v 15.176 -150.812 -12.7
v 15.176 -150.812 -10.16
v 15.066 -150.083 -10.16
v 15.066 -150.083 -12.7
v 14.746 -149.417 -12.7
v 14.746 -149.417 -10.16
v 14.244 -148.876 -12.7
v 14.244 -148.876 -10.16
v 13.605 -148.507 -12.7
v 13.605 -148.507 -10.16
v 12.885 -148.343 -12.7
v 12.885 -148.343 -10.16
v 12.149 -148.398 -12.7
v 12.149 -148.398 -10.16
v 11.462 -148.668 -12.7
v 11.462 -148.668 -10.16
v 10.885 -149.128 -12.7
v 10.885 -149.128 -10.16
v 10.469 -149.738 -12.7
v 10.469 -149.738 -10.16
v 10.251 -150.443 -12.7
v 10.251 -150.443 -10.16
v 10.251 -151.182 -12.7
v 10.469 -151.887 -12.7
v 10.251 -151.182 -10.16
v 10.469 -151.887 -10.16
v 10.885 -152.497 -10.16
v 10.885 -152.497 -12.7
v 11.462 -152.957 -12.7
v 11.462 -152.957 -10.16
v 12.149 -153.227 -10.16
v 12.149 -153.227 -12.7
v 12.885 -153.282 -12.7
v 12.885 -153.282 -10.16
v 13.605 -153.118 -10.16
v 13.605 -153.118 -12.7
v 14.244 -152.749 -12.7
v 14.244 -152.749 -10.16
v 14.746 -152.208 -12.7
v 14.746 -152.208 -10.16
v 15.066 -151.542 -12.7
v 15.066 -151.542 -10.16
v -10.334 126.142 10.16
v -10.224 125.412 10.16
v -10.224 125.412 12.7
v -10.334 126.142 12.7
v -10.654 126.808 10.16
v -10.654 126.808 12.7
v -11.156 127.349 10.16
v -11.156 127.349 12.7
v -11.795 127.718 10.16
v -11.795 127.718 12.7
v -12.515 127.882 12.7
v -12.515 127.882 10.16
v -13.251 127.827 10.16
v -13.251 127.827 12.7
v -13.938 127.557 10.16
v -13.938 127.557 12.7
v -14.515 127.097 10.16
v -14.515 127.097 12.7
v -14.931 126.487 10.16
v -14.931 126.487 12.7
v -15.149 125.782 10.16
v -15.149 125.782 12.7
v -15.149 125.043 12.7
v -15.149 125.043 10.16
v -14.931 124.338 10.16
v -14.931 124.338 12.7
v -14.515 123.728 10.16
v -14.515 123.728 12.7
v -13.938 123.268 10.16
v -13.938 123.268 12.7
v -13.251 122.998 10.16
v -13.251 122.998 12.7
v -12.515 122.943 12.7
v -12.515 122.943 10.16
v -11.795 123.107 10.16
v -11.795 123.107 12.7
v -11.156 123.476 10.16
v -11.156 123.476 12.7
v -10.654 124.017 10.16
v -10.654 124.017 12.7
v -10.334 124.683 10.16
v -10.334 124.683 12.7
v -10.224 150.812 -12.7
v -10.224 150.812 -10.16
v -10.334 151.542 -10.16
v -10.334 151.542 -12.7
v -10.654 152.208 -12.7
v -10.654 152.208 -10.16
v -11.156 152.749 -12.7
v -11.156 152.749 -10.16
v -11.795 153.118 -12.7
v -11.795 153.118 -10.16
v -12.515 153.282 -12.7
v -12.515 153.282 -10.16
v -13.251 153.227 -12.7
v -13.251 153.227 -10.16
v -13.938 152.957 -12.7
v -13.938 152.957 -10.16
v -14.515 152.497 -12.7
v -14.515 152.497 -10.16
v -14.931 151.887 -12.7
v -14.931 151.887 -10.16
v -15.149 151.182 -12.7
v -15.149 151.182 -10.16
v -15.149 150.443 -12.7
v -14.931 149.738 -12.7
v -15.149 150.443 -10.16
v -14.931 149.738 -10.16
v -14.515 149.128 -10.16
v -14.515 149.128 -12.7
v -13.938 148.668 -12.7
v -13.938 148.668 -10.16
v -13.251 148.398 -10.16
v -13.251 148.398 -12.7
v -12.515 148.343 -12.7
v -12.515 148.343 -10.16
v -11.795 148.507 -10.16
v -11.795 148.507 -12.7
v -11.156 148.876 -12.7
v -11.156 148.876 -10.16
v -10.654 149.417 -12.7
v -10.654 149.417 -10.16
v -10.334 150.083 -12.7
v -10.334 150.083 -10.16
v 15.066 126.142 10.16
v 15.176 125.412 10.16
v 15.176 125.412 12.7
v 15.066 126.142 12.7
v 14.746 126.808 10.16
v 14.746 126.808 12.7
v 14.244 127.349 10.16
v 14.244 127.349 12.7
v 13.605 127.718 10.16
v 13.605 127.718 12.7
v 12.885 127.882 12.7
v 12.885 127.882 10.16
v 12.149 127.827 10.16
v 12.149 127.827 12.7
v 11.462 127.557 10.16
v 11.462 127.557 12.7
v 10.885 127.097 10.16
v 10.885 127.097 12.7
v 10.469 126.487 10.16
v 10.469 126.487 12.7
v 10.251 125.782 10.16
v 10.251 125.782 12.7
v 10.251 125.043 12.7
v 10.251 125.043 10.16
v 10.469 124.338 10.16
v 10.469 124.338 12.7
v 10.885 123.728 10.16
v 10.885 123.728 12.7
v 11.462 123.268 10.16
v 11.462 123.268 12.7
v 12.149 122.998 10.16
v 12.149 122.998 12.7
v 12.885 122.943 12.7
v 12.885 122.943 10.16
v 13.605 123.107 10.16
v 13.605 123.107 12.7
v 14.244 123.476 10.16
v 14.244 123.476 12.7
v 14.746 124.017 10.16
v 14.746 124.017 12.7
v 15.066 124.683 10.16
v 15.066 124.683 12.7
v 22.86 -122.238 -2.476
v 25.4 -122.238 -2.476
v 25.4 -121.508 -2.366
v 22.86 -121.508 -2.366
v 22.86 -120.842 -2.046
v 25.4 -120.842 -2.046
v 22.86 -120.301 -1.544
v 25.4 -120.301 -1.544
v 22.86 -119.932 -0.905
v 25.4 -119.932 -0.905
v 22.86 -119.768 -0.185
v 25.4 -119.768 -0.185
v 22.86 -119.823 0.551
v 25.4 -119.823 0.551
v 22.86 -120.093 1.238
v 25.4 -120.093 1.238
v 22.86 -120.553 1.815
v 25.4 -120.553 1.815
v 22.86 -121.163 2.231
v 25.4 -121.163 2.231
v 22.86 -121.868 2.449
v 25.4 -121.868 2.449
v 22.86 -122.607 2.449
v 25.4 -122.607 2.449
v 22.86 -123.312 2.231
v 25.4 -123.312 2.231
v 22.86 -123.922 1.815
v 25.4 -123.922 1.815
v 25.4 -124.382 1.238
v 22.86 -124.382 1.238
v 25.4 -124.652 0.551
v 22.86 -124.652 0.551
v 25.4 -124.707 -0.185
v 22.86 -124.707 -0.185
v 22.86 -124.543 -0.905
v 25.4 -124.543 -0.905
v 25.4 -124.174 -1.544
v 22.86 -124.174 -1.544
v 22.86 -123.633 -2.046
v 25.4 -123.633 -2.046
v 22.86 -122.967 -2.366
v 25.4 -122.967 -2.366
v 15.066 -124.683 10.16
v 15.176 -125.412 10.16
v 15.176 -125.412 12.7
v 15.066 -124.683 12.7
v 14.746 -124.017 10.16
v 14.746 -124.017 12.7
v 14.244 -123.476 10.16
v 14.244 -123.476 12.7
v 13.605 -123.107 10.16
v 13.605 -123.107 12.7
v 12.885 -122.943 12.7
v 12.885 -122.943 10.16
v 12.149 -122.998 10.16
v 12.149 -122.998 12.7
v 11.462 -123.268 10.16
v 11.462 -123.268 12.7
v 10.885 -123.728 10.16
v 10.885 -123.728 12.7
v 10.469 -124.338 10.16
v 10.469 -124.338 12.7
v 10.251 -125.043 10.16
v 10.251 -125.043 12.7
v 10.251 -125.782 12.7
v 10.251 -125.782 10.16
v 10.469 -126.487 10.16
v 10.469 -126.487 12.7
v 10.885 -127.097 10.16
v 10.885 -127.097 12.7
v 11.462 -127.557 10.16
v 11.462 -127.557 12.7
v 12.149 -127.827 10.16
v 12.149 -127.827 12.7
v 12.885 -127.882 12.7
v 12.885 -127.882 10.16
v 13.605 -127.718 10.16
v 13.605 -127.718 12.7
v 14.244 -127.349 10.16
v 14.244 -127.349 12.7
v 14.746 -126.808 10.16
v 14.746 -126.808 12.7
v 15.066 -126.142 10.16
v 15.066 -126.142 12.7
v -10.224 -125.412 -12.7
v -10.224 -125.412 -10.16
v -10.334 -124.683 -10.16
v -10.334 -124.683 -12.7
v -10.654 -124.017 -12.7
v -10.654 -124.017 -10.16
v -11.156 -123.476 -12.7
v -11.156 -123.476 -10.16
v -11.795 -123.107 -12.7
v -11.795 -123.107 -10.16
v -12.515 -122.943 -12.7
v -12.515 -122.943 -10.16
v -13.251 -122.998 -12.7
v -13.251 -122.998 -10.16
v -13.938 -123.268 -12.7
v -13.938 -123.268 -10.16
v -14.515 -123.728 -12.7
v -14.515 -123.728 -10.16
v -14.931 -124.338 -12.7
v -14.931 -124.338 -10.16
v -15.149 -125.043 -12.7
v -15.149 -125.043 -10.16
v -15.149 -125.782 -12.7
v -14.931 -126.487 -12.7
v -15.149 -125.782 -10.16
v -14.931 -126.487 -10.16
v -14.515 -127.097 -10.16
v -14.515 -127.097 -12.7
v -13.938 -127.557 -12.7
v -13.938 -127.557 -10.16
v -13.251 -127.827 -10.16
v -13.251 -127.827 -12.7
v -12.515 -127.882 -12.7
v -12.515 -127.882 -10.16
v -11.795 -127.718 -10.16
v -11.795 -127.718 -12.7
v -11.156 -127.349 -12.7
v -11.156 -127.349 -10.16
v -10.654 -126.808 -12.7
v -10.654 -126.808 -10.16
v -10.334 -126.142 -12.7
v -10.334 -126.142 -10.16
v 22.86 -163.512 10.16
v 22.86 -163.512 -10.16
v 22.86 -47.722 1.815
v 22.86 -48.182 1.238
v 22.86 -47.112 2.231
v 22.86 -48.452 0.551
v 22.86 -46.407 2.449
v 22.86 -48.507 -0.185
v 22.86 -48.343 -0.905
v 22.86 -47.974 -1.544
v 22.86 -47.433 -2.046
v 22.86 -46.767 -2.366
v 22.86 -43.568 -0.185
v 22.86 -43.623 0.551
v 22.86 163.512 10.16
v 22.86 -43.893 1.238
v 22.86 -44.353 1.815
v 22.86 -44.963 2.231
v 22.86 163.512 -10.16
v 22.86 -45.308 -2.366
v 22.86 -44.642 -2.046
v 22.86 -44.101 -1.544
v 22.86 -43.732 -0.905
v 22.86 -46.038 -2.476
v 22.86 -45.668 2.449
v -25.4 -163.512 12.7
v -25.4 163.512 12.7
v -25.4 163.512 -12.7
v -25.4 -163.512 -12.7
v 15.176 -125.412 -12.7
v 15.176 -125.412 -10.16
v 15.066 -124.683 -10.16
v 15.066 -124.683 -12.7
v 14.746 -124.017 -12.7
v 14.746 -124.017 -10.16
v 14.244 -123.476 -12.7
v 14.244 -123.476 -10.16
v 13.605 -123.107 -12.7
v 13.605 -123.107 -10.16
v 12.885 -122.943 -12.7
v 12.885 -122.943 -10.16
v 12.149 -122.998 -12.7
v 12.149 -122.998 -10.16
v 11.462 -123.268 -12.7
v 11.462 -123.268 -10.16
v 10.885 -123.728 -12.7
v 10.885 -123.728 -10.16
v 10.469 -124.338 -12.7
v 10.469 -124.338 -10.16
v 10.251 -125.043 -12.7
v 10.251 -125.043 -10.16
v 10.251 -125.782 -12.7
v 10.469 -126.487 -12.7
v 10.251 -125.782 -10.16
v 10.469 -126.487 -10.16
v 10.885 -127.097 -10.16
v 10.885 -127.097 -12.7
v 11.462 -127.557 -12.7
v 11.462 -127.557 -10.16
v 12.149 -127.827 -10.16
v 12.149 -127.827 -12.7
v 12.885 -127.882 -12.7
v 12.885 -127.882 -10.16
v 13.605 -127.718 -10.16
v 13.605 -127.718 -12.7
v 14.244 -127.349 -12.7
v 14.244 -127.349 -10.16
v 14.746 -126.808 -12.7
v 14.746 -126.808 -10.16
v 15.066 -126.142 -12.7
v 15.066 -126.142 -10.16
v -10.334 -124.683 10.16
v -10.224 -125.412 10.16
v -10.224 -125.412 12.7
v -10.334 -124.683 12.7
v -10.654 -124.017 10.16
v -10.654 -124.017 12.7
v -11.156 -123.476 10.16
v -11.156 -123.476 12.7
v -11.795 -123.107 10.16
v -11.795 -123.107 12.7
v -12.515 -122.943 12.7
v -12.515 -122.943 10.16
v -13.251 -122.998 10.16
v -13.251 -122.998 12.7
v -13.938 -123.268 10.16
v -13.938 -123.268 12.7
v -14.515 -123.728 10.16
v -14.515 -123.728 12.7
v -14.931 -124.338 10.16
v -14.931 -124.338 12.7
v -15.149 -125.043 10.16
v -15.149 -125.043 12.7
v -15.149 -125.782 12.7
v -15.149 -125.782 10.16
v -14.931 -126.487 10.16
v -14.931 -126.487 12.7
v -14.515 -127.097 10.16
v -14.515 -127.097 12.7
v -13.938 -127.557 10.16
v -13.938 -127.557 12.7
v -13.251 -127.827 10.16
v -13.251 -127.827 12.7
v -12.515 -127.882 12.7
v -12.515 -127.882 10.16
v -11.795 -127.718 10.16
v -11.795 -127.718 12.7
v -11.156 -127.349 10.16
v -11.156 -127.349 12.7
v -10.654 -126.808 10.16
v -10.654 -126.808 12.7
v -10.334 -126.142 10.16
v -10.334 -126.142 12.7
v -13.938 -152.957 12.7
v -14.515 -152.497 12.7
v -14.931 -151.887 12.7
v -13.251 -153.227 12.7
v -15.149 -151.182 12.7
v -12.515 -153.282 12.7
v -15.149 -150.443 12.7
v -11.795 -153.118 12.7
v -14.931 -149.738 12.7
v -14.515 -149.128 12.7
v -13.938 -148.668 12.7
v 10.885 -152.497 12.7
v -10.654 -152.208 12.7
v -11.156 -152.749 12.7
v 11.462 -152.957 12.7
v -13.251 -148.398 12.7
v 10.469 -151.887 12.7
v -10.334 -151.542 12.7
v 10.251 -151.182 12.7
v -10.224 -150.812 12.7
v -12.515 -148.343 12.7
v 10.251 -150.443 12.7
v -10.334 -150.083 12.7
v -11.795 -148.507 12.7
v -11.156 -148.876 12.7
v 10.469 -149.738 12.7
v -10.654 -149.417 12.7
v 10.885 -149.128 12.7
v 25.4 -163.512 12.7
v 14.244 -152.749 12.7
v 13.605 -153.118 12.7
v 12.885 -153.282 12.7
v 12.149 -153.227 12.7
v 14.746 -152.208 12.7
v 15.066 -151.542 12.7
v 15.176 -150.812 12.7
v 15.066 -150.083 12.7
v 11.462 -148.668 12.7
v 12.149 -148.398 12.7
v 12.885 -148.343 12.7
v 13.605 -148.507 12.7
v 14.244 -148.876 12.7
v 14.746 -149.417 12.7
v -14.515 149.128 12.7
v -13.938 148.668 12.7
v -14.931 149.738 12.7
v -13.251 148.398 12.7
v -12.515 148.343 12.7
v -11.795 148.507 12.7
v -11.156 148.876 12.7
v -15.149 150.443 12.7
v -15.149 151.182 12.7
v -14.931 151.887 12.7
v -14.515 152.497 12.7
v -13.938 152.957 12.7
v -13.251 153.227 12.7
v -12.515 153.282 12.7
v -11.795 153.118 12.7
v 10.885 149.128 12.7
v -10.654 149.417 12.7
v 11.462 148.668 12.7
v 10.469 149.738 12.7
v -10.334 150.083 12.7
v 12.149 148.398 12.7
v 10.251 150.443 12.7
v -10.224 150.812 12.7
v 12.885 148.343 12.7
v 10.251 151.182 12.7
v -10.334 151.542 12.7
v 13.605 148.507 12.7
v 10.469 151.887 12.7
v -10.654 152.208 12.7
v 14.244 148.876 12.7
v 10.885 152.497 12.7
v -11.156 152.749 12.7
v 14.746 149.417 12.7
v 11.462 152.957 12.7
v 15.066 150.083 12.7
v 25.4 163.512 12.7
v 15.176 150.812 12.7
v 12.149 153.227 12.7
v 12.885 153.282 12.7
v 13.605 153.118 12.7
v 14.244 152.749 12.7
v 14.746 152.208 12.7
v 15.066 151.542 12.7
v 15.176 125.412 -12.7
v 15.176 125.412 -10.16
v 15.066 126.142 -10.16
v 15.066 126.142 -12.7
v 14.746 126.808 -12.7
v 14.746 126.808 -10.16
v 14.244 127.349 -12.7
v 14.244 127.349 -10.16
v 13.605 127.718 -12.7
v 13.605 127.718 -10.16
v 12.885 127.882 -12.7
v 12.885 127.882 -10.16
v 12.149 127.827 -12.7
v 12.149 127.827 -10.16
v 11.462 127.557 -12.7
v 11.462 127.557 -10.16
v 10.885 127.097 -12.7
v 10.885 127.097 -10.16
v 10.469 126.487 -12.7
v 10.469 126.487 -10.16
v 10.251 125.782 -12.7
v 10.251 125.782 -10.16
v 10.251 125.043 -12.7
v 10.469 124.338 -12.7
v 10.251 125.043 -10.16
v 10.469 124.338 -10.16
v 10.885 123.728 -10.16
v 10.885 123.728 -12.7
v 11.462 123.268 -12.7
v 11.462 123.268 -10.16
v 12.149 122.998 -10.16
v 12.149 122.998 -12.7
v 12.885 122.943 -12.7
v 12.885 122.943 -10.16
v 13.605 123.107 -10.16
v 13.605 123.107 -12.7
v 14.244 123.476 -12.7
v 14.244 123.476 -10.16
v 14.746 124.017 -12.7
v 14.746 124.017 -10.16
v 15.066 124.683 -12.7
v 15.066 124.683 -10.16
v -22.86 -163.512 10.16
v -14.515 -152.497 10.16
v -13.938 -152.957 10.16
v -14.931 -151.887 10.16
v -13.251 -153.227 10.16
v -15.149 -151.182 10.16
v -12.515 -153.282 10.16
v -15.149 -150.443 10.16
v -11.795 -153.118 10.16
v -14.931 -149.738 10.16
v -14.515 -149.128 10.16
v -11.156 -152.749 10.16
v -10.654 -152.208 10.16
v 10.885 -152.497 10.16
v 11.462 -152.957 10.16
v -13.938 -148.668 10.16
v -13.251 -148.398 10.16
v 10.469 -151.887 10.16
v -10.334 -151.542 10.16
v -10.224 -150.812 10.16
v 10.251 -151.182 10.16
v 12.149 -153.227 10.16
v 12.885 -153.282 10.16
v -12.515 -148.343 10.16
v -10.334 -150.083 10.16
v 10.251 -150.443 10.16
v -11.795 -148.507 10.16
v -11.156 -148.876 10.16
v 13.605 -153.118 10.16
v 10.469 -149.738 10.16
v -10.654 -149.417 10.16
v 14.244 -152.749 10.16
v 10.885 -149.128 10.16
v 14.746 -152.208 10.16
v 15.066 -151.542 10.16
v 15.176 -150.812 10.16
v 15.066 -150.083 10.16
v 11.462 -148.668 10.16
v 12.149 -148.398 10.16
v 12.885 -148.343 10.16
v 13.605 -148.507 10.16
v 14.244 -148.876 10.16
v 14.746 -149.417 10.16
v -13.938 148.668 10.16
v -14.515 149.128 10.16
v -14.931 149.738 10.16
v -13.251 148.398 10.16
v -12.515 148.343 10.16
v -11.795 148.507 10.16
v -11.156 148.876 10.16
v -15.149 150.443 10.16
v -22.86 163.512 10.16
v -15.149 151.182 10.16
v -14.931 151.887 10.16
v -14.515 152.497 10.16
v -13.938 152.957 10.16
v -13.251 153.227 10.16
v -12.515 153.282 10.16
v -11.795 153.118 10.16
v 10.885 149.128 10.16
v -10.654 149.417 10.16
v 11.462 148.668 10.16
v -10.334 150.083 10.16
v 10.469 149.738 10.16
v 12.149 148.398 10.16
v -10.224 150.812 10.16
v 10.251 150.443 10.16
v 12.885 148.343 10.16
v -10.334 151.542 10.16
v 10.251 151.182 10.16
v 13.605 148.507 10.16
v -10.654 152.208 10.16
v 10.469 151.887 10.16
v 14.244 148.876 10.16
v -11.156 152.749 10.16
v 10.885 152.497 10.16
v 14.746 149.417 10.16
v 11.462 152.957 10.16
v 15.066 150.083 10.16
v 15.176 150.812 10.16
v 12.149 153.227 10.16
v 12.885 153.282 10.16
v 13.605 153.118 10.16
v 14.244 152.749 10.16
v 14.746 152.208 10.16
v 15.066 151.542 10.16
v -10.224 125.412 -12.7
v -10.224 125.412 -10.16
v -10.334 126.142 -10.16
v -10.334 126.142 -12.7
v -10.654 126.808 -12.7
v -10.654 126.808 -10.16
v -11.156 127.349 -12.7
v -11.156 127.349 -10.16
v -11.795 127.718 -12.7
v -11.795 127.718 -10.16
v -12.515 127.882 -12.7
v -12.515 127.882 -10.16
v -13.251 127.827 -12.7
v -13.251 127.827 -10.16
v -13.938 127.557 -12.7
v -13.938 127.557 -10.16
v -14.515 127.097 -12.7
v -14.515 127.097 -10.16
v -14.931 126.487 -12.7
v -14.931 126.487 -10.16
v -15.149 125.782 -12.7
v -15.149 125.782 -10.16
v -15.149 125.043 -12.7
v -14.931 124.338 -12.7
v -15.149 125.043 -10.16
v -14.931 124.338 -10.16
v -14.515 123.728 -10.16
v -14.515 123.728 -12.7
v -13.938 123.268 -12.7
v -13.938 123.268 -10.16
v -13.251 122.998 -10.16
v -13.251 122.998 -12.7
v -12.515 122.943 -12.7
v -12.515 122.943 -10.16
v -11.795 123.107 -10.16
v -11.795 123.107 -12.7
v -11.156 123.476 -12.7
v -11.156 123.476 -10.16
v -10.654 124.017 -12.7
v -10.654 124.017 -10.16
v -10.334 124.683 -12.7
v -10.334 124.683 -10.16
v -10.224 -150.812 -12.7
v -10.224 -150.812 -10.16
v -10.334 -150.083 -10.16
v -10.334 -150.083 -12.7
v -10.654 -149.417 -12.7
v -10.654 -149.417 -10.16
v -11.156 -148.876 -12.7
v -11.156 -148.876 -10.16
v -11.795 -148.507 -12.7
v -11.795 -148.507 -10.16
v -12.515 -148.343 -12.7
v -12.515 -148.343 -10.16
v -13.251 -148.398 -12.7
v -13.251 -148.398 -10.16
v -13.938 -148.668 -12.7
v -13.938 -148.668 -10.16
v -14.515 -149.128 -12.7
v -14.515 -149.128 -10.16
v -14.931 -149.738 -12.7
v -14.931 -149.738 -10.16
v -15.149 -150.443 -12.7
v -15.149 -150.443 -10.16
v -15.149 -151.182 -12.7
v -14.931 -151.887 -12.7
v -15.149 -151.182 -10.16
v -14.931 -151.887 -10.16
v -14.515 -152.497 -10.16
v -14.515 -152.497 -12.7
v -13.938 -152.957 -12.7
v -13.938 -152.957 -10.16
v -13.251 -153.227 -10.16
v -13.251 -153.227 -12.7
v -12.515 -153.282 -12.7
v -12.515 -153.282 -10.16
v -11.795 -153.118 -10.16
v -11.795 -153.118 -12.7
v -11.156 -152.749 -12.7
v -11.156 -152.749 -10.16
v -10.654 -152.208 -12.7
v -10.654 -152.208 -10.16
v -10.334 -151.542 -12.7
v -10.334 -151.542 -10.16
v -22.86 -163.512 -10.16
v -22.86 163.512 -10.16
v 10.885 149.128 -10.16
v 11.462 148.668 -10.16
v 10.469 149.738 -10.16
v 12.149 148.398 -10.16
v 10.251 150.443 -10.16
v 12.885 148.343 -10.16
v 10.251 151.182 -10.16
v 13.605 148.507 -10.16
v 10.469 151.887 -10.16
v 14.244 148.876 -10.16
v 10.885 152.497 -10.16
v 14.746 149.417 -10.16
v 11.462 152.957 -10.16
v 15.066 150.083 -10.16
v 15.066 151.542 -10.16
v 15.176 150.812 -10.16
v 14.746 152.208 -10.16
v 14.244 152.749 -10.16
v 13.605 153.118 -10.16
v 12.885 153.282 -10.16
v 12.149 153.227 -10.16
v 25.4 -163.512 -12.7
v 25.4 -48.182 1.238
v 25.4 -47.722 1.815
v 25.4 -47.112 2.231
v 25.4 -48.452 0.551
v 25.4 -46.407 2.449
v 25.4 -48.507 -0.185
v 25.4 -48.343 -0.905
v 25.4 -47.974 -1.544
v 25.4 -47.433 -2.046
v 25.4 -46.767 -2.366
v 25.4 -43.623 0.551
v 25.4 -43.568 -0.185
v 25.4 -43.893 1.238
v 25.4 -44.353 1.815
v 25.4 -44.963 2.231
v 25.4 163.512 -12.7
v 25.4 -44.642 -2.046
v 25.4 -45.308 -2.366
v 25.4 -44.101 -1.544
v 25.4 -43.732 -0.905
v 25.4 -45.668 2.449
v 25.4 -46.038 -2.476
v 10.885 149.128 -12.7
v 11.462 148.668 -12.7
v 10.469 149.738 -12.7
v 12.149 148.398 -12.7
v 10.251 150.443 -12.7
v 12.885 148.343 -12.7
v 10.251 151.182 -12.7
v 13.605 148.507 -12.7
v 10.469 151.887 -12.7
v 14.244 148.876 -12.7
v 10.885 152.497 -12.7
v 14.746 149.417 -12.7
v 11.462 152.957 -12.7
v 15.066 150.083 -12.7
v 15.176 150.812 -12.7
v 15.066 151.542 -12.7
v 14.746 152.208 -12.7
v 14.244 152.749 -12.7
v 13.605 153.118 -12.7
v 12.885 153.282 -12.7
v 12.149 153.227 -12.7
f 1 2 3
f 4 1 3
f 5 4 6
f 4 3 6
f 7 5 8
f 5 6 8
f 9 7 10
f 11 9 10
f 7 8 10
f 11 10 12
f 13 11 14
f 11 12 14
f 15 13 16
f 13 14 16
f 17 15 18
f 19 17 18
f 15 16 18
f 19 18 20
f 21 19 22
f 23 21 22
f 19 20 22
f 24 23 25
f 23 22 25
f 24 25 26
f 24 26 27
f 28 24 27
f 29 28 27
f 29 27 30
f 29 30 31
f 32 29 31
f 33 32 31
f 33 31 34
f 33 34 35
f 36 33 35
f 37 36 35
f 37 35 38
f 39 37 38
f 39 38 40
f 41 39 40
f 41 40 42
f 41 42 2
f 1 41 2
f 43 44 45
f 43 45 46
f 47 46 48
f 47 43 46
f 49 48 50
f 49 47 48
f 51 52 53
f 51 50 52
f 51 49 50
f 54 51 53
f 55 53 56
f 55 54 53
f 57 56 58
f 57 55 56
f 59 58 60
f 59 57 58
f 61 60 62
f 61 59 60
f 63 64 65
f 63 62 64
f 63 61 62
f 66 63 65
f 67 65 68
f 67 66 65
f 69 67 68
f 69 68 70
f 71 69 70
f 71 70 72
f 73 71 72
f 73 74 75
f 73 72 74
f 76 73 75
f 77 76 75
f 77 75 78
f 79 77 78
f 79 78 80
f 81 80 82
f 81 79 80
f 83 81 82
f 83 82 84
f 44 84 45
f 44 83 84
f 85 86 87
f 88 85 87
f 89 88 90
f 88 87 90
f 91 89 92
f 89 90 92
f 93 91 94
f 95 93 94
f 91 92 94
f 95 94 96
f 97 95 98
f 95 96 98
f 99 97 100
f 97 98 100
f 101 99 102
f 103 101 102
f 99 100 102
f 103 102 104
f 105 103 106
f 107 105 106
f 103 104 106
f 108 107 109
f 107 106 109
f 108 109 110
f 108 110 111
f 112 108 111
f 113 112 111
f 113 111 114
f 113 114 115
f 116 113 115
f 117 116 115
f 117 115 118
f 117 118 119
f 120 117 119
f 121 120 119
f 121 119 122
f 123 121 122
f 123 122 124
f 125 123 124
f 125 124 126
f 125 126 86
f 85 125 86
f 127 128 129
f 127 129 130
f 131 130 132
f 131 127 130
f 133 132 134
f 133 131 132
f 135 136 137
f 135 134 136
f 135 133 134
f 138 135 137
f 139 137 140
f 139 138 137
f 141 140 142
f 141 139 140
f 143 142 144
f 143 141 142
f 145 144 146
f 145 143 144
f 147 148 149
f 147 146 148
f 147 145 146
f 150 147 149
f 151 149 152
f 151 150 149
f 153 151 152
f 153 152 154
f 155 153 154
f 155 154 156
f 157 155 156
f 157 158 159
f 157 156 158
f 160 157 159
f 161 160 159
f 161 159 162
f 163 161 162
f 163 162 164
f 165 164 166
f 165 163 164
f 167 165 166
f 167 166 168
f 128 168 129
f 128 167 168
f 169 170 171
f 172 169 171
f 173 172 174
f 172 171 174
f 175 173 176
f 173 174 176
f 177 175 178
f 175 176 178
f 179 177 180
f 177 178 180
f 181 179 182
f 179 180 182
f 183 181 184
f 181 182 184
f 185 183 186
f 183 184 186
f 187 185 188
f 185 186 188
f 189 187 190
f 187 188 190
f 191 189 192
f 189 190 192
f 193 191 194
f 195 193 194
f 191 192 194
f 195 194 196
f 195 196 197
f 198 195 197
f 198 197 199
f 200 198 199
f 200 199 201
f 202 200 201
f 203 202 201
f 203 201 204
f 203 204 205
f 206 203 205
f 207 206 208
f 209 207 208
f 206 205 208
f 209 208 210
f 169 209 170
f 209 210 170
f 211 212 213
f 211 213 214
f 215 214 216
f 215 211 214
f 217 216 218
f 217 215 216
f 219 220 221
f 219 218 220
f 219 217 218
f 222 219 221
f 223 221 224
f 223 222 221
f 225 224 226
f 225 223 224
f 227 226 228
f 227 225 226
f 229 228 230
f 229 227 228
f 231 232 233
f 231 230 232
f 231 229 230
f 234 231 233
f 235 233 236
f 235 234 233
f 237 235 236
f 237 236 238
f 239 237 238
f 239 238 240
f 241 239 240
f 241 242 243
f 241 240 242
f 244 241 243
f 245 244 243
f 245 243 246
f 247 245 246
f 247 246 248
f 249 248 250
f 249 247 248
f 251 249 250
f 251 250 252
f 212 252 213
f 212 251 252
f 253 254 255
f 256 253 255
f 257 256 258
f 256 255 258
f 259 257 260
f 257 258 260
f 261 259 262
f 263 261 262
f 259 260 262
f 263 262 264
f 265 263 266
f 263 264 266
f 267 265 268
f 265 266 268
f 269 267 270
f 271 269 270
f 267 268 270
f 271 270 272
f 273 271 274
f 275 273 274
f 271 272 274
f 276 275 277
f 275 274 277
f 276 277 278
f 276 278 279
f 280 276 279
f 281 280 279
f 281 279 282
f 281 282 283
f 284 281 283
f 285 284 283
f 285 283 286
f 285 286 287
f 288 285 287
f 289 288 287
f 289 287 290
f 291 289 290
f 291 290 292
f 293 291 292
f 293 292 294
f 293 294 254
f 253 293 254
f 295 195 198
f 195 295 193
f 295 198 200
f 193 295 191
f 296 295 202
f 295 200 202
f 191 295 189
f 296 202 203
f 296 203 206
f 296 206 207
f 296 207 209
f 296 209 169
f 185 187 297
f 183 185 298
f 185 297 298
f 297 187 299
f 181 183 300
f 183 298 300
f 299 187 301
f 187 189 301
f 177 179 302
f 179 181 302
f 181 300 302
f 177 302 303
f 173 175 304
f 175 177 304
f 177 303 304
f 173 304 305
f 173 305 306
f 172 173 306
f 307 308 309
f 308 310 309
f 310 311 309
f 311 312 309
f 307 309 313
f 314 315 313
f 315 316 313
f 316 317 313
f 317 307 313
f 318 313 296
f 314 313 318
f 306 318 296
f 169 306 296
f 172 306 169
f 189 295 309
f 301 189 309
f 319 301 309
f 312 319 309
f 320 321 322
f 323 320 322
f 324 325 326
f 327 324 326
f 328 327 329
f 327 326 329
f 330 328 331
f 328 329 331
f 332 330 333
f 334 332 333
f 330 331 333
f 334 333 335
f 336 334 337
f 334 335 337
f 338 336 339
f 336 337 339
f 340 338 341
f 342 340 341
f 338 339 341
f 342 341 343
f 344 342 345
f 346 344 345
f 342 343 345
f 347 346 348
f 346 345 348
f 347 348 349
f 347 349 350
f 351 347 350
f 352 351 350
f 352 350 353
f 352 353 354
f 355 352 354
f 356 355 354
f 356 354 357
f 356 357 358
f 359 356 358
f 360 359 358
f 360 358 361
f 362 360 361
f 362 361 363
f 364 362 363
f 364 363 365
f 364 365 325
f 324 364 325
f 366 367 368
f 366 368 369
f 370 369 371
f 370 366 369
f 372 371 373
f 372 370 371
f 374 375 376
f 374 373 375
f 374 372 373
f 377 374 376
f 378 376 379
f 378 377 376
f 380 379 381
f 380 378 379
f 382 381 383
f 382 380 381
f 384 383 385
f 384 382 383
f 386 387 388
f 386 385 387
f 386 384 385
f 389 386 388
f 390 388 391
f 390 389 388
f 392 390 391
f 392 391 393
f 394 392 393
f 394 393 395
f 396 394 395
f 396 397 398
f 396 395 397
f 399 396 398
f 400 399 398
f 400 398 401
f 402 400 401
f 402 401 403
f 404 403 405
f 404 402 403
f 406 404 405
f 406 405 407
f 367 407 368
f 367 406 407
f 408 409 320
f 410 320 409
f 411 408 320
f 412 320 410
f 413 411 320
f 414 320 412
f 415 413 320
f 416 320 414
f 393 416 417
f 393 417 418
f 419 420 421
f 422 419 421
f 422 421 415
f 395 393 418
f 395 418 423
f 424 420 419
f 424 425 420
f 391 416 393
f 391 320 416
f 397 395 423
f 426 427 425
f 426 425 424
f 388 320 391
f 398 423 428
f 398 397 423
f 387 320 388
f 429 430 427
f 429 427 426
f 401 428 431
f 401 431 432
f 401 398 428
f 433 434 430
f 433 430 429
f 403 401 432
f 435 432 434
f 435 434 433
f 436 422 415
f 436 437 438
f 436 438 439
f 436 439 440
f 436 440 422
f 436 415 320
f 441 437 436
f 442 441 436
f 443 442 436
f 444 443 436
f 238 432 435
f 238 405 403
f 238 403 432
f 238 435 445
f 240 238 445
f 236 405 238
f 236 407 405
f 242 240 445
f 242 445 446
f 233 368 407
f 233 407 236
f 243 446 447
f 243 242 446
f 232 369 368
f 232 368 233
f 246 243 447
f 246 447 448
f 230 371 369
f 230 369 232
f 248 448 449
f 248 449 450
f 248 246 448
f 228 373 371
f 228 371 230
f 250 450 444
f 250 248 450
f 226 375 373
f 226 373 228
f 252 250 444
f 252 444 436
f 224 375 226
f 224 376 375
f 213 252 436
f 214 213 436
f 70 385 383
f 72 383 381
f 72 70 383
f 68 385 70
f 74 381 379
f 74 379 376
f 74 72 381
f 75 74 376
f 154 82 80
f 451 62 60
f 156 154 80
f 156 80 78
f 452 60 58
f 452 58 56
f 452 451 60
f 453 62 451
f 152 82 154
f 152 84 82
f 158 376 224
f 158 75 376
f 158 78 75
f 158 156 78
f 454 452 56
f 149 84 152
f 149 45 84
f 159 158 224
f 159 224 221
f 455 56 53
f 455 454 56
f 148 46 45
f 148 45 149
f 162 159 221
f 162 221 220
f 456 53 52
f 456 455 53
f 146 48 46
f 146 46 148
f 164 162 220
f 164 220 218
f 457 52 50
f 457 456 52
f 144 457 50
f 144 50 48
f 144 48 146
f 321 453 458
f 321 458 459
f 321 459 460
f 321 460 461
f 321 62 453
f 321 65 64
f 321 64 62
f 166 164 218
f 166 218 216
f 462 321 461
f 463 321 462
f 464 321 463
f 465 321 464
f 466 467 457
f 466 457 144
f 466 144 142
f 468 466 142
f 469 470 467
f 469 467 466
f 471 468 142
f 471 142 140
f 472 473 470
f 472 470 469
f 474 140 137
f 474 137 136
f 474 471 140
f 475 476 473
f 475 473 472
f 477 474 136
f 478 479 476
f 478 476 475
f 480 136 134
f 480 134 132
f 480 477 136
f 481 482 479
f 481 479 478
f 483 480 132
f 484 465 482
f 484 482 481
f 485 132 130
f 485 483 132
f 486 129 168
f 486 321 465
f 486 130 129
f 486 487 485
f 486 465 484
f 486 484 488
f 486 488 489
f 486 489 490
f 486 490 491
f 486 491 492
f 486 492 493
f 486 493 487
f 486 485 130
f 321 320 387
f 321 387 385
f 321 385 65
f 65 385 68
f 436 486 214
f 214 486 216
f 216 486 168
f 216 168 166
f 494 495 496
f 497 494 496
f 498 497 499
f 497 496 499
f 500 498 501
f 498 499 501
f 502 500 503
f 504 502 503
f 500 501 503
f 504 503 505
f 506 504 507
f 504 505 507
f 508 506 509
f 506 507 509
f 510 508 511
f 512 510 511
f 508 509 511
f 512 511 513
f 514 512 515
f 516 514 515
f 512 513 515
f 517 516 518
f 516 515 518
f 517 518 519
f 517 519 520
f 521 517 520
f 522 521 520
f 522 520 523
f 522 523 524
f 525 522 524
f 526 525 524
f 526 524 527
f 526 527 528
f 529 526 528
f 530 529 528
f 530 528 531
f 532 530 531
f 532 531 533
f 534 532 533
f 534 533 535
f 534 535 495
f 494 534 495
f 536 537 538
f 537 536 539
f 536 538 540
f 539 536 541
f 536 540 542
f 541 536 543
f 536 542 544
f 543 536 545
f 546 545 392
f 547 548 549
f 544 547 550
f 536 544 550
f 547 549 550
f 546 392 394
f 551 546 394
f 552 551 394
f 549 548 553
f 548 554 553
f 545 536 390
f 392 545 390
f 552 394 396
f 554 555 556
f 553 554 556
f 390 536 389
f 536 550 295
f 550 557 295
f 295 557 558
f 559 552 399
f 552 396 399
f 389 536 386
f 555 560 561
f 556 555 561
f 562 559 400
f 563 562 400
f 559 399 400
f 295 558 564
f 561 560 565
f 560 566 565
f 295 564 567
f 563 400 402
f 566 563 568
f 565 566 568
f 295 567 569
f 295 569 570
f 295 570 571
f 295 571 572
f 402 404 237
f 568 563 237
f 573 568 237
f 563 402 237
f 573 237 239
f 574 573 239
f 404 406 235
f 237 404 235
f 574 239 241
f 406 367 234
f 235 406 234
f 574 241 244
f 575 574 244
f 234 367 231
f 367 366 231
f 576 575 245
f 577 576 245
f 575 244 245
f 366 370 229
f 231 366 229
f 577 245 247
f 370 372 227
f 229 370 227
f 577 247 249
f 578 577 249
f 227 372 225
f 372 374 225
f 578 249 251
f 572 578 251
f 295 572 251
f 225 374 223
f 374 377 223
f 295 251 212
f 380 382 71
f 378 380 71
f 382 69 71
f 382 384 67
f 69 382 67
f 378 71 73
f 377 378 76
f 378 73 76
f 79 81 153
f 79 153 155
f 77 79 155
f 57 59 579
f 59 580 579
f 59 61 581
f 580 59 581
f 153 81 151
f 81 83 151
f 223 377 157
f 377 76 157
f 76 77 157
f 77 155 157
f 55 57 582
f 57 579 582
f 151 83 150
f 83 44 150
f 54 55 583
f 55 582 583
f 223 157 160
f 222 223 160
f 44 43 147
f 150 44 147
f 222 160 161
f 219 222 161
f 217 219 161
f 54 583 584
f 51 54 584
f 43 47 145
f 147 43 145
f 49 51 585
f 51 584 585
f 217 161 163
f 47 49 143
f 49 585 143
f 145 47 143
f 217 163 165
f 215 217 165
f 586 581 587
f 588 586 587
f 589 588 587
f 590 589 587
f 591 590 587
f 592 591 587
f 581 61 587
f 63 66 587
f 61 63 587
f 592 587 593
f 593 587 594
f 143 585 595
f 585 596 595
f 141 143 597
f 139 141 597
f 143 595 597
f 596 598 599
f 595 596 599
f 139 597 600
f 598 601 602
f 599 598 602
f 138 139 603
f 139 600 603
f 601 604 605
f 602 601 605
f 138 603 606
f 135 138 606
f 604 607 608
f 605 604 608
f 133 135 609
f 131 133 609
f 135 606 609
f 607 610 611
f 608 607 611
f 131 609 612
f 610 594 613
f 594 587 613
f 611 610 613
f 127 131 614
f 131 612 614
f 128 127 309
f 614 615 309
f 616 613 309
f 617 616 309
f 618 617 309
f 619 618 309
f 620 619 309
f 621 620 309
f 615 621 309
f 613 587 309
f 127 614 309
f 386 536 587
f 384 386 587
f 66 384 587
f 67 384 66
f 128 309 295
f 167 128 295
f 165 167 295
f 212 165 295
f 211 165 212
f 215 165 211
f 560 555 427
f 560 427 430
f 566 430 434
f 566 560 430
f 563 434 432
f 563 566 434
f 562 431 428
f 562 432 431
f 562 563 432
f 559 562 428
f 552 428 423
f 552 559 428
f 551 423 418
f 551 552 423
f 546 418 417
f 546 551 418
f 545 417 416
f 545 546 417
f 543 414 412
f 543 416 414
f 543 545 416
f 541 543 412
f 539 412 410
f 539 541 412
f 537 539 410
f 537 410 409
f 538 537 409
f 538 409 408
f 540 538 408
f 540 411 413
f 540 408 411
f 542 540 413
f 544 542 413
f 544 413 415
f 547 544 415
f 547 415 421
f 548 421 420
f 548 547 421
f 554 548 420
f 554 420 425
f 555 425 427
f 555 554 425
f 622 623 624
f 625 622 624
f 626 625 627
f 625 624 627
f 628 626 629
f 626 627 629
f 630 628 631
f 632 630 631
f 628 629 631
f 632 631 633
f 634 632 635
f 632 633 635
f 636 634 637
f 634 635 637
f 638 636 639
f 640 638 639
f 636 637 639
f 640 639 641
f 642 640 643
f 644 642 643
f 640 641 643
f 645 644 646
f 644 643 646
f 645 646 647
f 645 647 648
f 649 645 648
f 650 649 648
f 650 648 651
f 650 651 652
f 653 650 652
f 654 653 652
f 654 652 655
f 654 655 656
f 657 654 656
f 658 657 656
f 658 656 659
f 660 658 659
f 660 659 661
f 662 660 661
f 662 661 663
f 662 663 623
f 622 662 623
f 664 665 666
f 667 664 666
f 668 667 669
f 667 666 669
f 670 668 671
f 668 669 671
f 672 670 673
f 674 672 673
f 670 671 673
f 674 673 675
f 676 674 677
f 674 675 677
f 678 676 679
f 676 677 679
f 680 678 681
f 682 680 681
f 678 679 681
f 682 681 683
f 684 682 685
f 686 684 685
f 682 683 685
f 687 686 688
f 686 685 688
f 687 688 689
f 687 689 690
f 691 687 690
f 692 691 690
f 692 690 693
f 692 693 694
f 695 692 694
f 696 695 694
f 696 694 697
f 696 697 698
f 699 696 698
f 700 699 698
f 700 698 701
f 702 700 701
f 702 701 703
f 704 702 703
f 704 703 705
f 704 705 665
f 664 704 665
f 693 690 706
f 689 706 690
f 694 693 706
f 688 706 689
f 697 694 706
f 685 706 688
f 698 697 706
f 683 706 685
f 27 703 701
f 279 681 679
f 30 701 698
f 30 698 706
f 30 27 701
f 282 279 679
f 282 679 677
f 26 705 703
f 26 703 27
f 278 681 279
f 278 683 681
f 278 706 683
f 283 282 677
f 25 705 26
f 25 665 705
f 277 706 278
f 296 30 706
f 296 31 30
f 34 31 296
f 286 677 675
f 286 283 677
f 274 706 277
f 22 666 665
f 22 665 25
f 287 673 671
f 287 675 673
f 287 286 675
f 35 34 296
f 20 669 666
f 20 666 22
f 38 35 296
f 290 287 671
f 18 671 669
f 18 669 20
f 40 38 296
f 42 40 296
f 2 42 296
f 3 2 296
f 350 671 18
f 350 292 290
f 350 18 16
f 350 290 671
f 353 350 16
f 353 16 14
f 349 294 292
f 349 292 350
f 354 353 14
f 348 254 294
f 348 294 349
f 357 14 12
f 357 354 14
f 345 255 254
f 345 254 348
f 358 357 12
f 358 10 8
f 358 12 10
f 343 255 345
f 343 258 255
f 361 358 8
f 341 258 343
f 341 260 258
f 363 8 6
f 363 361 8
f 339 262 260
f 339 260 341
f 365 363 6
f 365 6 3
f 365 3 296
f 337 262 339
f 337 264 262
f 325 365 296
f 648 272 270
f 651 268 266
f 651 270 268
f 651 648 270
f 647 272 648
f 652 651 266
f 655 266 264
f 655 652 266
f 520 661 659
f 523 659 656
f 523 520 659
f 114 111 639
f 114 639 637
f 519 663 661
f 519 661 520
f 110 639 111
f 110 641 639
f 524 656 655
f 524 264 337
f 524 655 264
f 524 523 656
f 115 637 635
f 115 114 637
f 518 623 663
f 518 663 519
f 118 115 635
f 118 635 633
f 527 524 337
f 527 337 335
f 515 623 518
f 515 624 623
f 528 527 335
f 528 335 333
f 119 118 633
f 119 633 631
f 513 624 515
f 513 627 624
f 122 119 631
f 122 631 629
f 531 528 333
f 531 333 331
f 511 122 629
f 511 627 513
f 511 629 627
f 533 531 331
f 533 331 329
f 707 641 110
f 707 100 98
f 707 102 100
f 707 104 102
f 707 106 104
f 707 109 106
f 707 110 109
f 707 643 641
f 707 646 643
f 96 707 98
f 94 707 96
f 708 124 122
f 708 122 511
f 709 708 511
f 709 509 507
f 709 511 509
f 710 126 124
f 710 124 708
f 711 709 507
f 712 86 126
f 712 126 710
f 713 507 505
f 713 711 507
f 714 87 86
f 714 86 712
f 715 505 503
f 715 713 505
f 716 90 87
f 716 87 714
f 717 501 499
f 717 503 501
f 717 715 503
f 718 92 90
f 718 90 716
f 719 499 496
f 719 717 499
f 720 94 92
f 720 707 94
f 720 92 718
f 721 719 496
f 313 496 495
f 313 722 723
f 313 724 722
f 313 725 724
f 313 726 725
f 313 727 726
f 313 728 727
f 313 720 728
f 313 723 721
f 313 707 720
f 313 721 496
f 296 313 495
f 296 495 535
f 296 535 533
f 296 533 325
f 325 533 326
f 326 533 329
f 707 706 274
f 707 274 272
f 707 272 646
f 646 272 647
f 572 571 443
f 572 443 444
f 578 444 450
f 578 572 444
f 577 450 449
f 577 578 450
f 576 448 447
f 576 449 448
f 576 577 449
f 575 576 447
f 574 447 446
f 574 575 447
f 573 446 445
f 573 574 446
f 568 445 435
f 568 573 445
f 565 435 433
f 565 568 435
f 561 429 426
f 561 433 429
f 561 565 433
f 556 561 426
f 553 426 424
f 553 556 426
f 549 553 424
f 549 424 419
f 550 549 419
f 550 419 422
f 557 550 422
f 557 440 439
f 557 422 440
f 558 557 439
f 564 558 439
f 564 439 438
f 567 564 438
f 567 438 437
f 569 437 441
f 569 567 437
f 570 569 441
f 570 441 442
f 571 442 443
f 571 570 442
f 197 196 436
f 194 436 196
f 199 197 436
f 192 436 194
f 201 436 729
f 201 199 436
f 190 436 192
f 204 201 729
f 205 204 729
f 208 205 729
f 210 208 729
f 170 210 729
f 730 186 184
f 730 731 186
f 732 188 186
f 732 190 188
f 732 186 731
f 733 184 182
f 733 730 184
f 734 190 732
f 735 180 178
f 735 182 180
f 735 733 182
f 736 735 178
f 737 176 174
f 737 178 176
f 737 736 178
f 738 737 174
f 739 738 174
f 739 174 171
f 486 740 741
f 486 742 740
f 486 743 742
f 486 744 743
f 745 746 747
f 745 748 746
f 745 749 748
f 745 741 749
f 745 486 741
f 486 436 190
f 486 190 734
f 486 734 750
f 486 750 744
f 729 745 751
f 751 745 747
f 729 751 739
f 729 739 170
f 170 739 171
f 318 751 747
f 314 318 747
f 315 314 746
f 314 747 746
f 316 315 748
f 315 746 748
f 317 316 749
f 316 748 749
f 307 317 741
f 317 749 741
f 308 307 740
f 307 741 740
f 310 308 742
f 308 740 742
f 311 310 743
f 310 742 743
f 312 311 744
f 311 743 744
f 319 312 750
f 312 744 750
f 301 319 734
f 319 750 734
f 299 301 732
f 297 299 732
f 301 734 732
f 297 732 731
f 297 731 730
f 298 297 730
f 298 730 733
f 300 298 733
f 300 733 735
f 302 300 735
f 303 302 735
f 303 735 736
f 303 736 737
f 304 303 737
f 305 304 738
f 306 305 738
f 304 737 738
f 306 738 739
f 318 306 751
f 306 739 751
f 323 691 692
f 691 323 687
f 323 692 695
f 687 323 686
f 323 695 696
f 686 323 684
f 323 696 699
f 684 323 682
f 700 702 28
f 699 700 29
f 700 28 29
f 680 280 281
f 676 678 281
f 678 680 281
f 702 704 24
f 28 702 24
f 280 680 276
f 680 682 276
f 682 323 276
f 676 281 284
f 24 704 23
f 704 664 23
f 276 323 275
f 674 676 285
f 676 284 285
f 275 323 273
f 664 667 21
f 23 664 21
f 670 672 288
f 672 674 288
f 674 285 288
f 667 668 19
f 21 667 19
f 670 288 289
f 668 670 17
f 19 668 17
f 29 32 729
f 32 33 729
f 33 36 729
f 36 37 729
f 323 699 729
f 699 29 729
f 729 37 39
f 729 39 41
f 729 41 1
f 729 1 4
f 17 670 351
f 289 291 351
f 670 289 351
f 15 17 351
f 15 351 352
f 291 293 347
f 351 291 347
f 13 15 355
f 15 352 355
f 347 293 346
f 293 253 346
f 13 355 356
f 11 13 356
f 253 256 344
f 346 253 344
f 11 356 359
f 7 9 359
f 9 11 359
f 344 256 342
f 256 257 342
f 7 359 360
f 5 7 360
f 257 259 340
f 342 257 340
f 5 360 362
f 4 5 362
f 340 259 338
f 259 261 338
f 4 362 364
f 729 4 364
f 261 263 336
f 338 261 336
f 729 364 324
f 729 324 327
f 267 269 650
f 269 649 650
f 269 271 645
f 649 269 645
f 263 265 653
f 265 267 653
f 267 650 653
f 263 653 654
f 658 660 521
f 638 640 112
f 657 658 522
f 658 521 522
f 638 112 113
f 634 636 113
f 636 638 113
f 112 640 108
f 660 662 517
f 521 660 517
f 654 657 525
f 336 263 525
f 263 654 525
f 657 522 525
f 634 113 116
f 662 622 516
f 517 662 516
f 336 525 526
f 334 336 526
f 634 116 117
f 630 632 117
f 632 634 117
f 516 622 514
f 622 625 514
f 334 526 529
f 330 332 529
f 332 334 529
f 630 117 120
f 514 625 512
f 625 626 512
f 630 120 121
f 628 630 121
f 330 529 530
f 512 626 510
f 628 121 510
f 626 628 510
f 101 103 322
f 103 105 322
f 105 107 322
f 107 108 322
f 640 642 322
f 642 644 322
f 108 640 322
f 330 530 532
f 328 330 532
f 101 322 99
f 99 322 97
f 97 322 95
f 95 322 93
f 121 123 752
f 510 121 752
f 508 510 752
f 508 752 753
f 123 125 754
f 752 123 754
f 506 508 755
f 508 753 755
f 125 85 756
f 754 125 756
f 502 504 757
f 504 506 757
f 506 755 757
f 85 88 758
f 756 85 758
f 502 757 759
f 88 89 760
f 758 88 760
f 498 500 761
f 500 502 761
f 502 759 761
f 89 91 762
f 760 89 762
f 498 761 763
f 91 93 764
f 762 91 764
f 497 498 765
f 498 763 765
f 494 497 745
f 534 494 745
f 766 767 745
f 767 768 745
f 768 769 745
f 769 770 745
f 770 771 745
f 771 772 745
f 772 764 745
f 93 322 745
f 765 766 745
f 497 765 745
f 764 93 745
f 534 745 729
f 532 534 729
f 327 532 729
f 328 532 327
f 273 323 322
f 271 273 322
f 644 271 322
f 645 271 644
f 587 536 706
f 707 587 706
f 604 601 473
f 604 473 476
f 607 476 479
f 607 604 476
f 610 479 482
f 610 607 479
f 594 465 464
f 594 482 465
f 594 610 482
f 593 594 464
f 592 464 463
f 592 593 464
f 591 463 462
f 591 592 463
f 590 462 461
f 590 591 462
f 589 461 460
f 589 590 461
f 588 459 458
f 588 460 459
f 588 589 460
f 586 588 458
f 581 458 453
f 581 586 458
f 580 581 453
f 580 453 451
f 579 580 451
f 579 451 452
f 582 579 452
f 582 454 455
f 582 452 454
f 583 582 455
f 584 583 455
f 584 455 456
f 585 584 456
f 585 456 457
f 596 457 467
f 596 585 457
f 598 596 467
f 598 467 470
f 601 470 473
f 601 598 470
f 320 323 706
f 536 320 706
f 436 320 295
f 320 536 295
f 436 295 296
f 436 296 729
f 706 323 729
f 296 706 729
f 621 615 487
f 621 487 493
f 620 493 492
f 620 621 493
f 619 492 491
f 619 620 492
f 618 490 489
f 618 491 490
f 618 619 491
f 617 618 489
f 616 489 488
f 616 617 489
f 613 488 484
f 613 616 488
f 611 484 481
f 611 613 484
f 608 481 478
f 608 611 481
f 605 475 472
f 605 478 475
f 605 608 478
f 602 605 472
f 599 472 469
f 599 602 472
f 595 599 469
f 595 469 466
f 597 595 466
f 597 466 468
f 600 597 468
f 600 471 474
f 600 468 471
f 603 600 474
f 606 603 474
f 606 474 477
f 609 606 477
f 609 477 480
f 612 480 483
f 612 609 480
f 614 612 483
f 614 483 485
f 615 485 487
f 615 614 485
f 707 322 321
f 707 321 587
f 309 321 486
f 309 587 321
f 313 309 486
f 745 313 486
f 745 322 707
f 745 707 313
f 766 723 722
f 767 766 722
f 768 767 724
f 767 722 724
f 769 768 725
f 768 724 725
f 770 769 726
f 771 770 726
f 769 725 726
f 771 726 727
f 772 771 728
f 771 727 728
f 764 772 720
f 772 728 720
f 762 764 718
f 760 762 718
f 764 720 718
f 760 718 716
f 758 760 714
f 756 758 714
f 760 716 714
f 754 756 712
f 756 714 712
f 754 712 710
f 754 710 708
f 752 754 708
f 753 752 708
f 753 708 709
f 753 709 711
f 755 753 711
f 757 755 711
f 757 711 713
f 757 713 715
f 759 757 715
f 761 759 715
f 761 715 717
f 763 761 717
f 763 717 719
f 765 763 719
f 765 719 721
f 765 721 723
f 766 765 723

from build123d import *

# Parameters (mm, degrees)
SKETCH1_W               = 50.8
SKETCH1_H               = 25.4
SKETCH1_W_2             = 45.72
SKETCH1_H_2             = 20.32
EXTRUDE_THIN1_DEPTH     = 163.5125
SKETCH3_R               = 2.4765
CUT_EXTRUDE2_DEPTH      = 13.7
CUT_EXTRUDE2_DEPTH_BACK = 13.7
SKETCH4_R               = 2.4765
CUT_EXTRUDE3_DEPTH      = 2.54


with BuildPart() as part:
    # Sketch1 → Extrude-Thin1 (new body, symmetric)
    with BuildSketch(Plane(origin=(0, 0, 0), x_dir=(1, 0, 0), z_dir=(0, 1, 0))):
        Rectangle(SKETCH1_W, SKETCH1_H)
        Rectangle(SKETCH1_W_2, SKETCH1_H_2, mode=Mode.SUBTRACT)
    extrude(amount=EXTRUDE_THIN1_DEPTH, both=True)

    # Sketch3 → Cut-Extrude2 (cut, two sides)
    with BuildSketch(Plane.XY) as cut_extrude2_sk:
        with Locations((-12.7, -125.4125)):
            Circle(SKETCH3_R)
        with Locations((12.7, -125.4125)):
            Circle(SKETCH3_R)
        with Locations((12.7, -150.8125)):
            Circle(SKETCH3_R)
        with Locations((-12.7, -150.8125)):
            Circle(SKETCH3_R)
        with Locations((12.7, 150.8125)):
            Circle(SKETCH3_R)
        with Locations((12.7, 125.4125)):
            Circle(SKETCH3_R)
        with Locations((-12.7, 125.4125)):
            Circle(SKETCH3_R)
        with Locations((-12.7, 150.8125)):
            Circle(SKETCH3_R)
    extrude(amount=CUT_EXTRUDE2_DEPTH, mode=Mode.SUBTRACT)
    extrude(cut_extrude2_sk.sketch, amount=-CUT_EXTRUDE2_DEPTH_BACK, mode=Mode.SUBTRACT)

    # Sketch4 → Cut-Extrude3 (cut)
    with BuildSketch(Plane(origin=(25.4, 0, 0), x_dir=(0, 0, -1), z_dir=(1, 0, 0))):
        with Locations((0, -46.0375)):
            Circle(SKETCH4_R)
        with Locations((0, -122.2375)):
            Circle(SKETCH4_R)
    extrude(amount=-CUT_EXTRUDE3_DEPTH, mode=Mode.SUBTRACT)


solid = part.part
